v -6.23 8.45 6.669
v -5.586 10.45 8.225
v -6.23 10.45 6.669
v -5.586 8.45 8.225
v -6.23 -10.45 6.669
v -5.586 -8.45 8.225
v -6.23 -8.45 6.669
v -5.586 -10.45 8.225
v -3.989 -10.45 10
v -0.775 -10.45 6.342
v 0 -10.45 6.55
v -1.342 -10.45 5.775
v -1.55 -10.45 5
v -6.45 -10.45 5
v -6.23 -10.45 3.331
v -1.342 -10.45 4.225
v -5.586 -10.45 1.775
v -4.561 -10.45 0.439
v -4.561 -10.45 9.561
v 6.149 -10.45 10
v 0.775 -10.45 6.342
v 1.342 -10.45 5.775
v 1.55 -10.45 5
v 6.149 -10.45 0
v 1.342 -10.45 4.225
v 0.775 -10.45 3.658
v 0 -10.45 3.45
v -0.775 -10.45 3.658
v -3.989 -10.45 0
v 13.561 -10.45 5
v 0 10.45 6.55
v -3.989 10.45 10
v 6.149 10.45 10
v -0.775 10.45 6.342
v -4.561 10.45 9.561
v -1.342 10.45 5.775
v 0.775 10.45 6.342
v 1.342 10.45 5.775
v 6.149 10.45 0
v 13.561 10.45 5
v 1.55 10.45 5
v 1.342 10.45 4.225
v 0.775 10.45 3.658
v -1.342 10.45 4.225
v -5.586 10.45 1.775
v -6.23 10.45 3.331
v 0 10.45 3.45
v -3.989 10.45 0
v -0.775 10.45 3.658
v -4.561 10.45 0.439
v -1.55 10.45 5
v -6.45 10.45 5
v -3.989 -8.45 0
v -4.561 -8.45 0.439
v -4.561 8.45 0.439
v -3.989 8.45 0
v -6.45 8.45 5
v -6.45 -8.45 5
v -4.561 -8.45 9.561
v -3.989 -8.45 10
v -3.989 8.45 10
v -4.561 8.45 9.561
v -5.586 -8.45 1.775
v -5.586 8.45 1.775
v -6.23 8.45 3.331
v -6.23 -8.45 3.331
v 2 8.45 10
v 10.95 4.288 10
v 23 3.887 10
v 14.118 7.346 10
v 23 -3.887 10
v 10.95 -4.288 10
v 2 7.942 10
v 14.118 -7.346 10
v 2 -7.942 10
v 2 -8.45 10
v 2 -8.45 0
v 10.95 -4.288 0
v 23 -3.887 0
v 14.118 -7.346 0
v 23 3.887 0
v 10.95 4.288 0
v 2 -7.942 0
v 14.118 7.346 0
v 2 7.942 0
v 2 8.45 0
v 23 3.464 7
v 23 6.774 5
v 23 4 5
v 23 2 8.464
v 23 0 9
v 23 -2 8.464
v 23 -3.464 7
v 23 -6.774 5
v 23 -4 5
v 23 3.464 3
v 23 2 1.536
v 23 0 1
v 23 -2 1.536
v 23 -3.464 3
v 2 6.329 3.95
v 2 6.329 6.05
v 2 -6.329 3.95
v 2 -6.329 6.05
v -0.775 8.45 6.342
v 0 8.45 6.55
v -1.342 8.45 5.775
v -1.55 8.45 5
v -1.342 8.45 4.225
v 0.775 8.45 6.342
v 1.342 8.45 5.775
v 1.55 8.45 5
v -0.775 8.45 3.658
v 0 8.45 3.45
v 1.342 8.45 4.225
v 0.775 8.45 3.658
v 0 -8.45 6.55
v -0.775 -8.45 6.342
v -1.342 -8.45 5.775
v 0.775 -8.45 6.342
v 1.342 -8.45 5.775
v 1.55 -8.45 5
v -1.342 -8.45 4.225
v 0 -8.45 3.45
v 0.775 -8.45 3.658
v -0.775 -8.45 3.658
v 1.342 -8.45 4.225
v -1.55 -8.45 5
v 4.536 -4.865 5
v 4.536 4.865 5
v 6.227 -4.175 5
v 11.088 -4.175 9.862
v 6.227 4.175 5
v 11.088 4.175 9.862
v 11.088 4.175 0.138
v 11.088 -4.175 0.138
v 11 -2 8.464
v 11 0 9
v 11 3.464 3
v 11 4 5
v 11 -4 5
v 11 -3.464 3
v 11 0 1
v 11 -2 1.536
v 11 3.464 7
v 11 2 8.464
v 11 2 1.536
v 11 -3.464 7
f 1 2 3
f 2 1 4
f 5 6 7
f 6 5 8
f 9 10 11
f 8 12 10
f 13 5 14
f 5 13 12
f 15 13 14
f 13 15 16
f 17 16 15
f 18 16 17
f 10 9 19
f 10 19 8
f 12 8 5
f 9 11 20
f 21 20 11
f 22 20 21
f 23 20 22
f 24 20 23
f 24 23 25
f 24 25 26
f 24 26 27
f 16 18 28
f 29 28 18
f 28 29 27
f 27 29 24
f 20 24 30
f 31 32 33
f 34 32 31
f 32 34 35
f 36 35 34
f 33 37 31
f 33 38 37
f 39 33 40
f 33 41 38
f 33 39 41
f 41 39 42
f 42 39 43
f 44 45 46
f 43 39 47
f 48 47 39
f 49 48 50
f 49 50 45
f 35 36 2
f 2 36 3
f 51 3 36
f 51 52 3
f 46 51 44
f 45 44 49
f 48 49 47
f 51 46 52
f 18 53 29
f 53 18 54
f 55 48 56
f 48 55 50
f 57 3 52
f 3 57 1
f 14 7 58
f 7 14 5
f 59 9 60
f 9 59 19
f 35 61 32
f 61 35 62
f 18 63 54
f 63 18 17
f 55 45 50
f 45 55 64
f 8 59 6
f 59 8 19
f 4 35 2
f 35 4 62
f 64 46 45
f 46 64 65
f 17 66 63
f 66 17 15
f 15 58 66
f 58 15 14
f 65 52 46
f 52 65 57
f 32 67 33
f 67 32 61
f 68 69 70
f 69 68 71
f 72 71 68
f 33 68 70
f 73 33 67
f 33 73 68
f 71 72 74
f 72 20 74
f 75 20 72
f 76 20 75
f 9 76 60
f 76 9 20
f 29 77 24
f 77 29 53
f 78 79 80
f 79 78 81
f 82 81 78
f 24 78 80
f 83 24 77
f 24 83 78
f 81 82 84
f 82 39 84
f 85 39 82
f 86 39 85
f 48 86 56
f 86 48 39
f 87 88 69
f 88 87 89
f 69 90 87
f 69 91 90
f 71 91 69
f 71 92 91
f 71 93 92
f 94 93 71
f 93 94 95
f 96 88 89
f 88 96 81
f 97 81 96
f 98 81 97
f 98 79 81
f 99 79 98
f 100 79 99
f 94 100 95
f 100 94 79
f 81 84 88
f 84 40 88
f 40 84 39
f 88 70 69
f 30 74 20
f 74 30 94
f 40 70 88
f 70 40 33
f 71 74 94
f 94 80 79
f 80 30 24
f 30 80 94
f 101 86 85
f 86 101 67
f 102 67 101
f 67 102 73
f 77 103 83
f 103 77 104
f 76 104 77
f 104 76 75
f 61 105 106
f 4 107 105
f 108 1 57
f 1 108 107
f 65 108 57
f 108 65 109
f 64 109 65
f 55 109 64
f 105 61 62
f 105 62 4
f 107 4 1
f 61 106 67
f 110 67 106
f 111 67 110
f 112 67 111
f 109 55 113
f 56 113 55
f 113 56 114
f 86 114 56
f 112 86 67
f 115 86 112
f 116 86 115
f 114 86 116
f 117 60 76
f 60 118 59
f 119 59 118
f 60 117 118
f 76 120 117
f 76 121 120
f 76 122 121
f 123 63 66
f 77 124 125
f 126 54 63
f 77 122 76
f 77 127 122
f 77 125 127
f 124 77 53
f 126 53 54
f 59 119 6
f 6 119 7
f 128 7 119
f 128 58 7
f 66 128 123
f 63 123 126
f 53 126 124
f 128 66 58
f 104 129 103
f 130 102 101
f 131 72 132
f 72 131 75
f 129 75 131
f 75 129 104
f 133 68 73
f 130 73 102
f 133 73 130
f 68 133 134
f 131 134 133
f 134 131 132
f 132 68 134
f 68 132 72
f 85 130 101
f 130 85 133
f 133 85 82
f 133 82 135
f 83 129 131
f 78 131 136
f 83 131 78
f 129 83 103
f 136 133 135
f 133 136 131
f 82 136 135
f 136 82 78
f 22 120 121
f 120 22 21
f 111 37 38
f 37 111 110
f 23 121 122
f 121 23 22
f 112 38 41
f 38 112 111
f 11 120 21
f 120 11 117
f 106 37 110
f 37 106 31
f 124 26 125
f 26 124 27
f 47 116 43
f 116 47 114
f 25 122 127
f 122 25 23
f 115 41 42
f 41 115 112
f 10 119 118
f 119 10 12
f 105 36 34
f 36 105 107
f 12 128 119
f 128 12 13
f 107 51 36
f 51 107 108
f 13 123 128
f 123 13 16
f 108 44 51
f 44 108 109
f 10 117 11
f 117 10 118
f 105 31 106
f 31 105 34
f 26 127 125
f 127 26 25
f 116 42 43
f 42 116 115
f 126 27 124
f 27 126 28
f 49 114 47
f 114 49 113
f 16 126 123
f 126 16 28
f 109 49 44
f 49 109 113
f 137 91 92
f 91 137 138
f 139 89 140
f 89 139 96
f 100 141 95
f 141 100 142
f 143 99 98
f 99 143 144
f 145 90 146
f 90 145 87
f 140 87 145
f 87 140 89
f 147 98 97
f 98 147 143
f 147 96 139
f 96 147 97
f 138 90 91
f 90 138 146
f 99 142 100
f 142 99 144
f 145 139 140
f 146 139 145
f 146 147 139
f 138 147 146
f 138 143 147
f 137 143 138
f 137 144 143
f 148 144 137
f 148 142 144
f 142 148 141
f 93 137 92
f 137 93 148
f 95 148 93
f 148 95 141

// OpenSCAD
// these jaws should be printed individually for carbon fiber
h = 10;
r = h/2 / cos(30) + 1;
co = 16.9;		// attachment thickness
mt = 4;		// mount thickness

module jaws() {
  difference() {
    union() {
      intersection () {
        rotate([90, 0, 0]) cylinder(r = co / 2 - mt / 2, h = co + mt, center=true, $fn=24);
        translate([-4, 0, 0]) cube([20, 24, h], center=true);
      }
      intersection() {
        translate([10, 0, 0]) cube([26, co + mt, h], center=true);
        translate([10, 0, 0]) rotate([0, 90, 0]) rotate([0, 0, 30])
          cylinder(r1=co, r2=r, h=26, center=true, $fn=6);
      }
    } 
    translate([-4.5, 0, 0]) cube([h + 3, co, h + 3], center=true);
    translate([-1.5, 0, 0]) rotate([0, 0, 30])
      cylinder(r=co / 2 - 0.1, h=10, center=true, $fn=6);
    translate([0, 0, 4]) rotate([0, 45, 0])
      rotate([0, 0, 30]) cylinder(r=co / 2 - 0.1, h = co, center=true, $fn=6);
    translate([0, 0, -4]) rotate([0, -45, 0])
      rotate([0, 0, 30]) cylinder(r=co / 2 - 0.1, h = co, center=true, $fn=6);
    rotate([90, 0, 0]) cylinder(r=1.55, h=40, center=true, $fn=12);
    translate([21, 0, 0]) rotate([0, 90, 0])
      cylinder(r=4, h=20, center=true, $fn=12); 
  }
}

translate([0, 0, h/2]) jaws();
